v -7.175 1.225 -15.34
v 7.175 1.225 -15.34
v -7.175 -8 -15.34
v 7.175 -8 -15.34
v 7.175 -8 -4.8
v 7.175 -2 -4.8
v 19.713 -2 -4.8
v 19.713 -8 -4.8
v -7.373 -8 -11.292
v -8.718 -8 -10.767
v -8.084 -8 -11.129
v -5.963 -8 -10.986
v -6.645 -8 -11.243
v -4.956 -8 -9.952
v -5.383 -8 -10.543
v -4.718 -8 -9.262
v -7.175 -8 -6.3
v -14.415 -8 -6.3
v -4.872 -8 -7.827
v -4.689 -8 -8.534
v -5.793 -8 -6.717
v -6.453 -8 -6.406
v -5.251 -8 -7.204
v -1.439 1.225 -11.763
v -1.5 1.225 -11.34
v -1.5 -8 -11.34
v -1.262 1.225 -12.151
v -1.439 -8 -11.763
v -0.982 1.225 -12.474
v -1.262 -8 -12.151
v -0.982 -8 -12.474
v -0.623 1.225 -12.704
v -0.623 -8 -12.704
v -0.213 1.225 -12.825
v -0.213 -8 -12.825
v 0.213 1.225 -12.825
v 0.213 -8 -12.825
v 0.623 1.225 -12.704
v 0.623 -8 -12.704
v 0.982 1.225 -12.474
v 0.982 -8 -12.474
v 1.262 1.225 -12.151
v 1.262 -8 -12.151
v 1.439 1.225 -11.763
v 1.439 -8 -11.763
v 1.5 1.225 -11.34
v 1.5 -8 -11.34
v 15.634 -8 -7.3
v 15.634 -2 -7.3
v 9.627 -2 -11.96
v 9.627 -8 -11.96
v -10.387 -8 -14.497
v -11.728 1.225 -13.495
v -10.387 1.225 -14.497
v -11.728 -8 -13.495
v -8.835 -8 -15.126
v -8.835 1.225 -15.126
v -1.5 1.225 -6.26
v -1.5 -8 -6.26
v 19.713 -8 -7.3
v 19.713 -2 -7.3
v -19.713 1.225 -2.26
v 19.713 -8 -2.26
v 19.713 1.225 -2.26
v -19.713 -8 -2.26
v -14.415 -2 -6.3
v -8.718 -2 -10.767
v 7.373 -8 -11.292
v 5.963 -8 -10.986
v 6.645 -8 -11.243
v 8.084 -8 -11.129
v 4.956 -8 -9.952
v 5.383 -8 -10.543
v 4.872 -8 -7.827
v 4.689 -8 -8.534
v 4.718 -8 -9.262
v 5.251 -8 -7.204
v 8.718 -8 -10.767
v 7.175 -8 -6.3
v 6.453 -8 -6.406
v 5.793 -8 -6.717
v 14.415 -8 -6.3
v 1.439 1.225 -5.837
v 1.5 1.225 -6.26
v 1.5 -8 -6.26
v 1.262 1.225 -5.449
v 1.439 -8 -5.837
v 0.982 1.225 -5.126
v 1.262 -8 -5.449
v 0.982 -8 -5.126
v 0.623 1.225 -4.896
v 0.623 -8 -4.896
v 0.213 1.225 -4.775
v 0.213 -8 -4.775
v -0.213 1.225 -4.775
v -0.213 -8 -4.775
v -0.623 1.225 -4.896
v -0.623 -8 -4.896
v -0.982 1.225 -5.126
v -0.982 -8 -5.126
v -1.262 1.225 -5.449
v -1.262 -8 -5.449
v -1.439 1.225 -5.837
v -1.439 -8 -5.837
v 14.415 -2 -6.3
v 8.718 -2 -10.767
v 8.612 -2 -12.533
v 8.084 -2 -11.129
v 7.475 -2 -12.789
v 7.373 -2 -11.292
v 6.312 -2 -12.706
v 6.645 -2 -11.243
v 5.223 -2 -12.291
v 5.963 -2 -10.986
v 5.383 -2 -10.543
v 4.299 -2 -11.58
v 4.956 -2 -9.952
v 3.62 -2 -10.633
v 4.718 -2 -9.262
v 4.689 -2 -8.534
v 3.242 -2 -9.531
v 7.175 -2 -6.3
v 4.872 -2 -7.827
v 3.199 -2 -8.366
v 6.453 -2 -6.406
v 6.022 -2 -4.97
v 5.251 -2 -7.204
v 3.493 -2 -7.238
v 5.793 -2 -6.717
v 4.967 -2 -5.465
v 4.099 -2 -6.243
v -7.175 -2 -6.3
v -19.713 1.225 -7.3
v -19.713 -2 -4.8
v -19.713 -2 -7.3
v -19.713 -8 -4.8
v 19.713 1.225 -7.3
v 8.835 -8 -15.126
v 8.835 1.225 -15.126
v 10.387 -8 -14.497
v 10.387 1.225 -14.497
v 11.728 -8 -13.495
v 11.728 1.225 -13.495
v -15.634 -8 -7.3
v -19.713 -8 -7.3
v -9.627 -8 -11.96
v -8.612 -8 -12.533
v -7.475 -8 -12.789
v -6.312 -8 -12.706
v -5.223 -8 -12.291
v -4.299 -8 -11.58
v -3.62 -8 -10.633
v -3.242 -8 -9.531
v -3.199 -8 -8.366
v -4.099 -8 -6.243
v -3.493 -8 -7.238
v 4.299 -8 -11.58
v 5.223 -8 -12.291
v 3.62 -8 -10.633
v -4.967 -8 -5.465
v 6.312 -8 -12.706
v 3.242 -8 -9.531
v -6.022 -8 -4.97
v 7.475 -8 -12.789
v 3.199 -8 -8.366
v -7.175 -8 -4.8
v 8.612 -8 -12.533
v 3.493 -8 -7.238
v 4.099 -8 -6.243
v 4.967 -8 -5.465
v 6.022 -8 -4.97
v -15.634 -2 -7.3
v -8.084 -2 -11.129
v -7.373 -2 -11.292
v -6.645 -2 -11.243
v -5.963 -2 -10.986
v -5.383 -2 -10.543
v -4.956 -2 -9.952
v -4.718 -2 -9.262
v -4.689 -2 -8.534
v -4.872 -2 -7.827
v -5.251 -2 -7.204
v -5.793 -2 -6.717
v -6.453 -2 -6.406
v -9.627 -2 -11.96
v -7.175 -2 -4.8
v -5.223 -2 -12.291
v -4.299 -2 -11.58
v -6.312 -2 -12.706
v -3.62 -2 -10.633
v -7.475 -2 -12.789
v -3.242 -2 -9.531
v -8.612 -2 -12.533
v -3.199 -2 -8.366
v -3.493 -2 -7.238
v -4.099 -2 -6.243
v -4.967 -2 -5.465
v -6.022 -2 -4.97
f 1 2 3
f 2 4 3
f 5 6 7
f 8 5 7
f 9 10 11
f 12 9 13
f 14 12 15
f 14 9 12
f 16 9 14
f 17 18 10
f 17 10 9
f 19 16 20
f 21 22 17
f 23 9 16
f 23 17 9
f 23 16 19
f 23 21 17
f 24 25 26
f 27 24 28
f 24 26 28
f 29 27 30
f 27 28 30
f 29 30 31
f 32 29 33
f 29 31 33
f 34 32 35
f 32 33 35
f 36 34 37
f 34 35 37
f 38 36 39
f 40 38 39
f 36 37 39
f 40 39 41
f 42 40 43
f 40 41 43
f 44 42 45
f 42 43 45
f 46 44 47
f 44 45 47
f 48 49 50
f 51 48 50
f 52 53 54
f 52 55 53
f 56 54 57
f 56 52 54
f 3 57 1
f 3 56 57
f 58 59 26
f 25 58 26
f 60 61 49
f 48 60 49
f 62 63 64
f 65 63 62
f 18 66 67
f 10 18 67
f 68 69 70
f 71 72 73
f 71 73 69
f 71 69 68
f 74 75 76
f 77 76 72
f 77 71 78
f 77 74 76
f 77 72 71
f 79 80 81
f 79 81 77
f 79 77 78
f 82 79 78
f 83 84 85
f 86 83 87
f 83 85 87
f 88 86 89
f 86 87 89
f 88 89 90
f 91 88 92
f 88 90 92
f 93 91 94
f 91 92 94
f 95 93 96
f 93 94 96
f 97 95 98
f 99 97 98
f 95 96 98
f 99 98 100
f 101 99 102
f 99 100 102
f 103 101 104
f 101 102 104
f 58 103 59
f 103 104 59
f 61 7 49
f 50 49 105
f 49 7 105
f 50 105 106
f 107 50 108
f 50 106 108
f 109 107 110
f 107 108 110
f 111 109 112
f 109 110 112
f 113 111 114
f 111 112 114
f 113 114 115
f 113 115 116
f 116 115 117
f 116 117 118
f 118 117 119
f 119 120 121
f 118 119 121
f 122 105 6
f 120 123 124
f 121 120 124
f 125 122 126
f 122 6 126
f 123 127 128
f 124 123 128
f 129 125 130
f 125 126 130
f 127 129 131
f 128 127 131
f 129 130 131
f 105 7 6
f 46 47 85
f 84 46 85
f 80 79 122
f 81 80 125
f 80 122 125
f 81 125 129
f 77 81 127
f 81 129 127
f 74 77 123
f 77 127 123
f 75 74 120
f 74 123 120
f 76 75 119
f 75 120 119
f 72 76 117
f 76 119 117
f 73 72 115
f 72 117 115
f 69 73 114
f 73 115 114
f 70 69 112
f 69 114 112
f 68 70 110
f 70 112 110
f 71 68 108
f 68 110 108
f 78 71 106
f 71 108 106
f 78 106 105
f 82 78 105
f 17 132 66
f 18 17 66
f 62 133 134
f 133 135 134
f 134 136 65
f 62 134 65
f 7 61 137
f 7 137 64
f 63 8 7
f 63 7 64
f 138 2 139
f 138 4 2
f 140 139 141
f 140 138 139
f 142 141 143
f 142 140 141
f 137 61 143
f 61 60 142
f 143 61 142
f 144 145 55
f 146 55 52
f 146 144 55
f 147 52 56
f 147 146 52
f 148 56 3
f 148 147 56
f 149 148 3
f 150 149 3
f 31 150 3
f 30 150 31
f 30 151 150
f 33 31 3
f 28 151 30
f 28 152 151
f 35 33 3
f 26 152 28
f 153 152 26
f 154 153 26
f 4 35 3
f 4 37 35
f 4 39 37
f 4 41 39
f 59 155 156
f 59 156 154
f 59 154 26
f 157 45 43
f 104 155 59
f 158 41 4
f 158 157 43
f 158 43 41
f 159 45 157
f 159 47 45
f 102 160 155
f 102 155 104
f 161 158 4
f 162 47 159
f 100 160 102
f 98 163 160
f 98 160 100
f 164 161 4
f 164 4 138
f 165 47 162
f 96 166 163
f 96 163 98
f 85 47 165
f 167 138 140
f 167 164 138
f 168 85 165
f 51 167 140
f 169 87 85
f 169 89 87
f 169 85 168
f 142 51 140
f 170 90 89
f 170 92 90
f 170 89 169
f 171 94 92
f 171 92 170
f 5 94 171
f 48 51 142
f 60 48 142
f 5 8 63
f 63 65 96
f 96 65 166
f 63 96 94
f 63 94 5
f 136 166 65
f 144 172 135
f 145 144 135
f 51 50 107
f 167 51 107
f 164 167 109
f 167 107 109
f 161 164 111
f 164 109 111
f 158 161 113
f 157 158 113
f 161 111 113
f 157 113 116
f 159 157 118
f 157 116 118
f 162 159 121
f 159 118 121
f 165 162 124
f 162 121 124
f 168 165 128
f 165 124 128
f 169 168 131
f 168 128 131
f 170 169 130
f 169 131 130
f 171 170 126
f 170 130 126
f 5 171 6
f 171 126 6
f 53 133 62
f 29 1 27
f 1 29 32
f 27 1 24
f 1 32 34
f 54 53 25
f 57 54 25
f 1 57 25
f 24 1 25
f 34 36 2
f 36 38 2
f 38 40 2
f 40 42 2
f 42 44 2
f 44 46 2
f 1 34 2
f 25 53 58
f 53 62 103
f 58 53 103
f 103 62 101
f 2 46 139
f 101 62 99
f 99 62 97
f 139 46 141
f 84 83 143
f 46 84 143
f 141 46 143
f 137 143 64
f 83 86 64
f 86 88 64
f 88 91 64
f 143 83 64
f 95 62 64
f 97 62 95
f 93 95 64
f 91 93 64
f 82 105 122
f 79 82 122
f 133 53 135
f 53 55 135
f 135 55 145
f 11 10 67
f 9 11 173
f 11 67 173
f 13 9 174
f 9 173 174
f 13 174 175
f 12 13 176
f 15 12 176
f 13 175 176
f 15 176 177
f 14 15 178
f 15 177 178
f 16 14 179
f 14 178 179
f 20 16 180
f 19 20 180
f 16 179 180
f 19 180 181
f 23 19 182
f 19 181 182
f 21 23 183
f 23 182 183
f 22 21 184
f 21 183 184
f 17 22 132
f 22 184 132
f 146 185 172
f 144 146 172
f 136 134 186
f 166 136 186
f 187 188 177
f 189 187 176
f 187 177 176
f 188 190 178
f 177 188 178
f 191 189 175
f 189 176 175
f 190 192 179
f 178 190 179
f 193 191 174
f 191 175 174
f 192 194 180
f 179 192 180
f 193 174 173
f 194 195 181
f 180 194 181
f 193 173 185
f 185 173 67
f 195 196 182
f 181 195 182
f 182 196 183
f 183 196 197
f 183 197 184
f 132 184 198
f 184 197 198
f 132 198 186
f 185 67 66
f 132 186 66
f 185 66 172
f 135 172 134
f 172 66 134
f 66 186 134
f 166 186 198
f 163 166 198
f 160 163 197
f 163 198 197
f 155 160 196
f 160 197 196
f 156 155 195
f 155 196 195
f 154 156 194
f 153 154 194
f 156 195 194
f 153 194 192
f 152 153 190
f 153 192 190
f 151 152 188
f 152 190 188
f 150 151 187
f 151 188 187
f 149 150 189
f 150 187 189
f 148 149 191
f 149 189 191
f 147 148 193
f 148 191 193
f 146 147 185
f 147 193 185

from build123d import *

# Parameters (mm, degrees)
F2_DEPTH  = 8
F3_W      = 40
F3_H      = 13.08
F4_DEPTH  = 2
F8_DEPTH  = 25.4
F9_DEPTH  = 0.2869853
F10_DEPTH = 0.2869852618
F11_DEPTH = 1.225
F13_DEPTH = 25.4


# Not quite as in the source:
# - an extrude ends at something that could not be found from the text; its depth is read off the source's solid


with BuildPart() as f2:
    # F1 (on Front) → F2 (new body)
    with BuildSketch(Plane.XZ):
        with BuildLine():
            Line((0, -2.26), (-20, -2.26))
            Line((-20, -2.26), (-20, -4.8))
            Line((-20, -4.8), (-7.175, -4.8))
            ThreePointArc((-7.175, -4.8), (-3.3907124319, -10.0958269953), (-9.6268909943, -11.9604161992))
            Line((-9.6268909943, -11.9604161992), (-15.6340319663, -7.3))
            Line((-15.6340319663, -7.3), (-20, -7.3))
            Line((-20, -7.3), (-20, -15.34))
            Line((-20, -15.34), (0, -15.34))
            Line((0, -15.34), (20, -15.34))
            Line((20, -15.34), (20, -7.3))
            Line((20, -7.3), (15.6340319663, -7.3))
            Line((15.6340319663, -7.3), (9.6268909943, -11.9604161992))
            ThreePointArc((9.6268909943, -11.9604161992), (3.3907124319, -10.0958269953), (7.175, -4.8))
            Line((7.175, -4.8), (20, -4.8))
            Line((20, -4.8), (20, -2.26))
            Line((20, -2.26), (0, -2.26))
        make_face()
    extrude(amount=F2_DEPTH)


with BuildPart() as f2b:
    # F1 (on Front) → F2, piece 2 (new body)
    with BuildSketch(Plane.XZ):
        with BuildLine():
            Line((-14.4153116271, -6.3), (-8.7175368467, -10.7673789865))
            ThreePointArc((-8.7175368467, -10.7673789865), (-4.8119037825, -9.6159511424), (-7.175, -6.3))
            Line((-7.175, -6.3), (-14.4153116271, -6.3))
        make_face()
    extrude(amount=F2_DEPTH)


with BuildPart() as f2c:
    # F1 (on Front) → F2, piece 3 (new body)
    with BuildSketch(Plane.XZ):
        with BuildLine():
            Line((8.7175368467, -10.7673789865), (14.4153116271, -6.3))
            Line((14.4153116271, -6.3), (7.175, -6.3))
            ThreePointArc((7.175, -6.3), (4.8119037825, -9.6159511424), (8.7175368467, -10.7673789865))
        make_face()
    extrude(amount=F2_DEPTH)


with BuildPart() as f4:
    # F3 (on face) → F4 (new body)
    with BuildSketch(Plane(origin=(0, 0, 0), x_dir=(-1, 0, 0), z_dir=(0, 1, 0))):
        with Locations((0, -8.8)):
            Rectangle(F3_W, F3_H)
    extrude(amount=-F4_DEPTH)

    # F5: union F2
    add(f2.part)


with BuildPart() as f2c_1:
    add(f2c.part)

    # F6: union F4, F2b
    add(f4.part)
    add(f2b.part)

    # F7 (on face) → F8 (cut)
    with BuildSketch(Plane.XZ.offset(8)):
        with BuildLine():
            Line((22.5005224347, -7.3), (20, -7.3))
            Line((20, -7.3), (19.7130147382, -7.3))
            Line((19.7130147382, -7.3), (11.7279629554, -13.4949045067))
            ThreePointArc((11.7279629554, -13.4949045067), (9.6313107017, -14.8611993646), (7.175, -15.34))
            Line((7.175, -15.34), (7.175, -19.2080270499))
            Line((7.175, -19.2080270499), (22.5005224347, -19.2080270499))
            Line((22.5005224347, -19.2080270499), (22.5005224347, -7.3))
        make_face()
        with BuildLine():
            Line((-19.7130147382, -7.3), (-20, -7.3))
            Line((-20, -7.3), (-22.5005224347, -7.3))
            Line((-22.5005224347, -7.3), (-22.5005224347, -19.2080270499))
            Line((-22.5005224347, -19.2080270499), (-7.175, -19.2080270499))
            Line((-7.175, -19.2080270499), (-7.175, -15.34))
            ThreePointArc((-7.175, -15.34), (-9.6313107017, -14.8611993646), (-11.7279629554, -13.4949045067))
            Line((-11.7279629554, -13.4949045067), (-19.7130147382, -7.3))
        make_face()
    extrude(amount=-F8_DEPTH, mode=Mode.SUBTRACT)

    # F9 (cut, through all): a face of the model
    f9_faces = [f2c_1.faces().sort_by_distance(p)[0] for p in [
        (20, -3.4075829384, -4.0276303318),
    ]]
    extrude(f9_faces, amount=-F9_DEPTH, mode=Mode.SUBTRACT)

    # F10 (cut, through all): a face of the model
    f10_faces = [f2c_1.faces().sort_by_distance(p)[0] for p in [
        (-20, -3.4075829384, -4.0276303318),
    ]]
    extrude(f10_faces, amount=-F10_DEPTH, mode=Mode.SUBTRACT)

    # F11 (add): a face of the model
    f11_faces = [f2c_1.faces().sort_by_distance(p)[0] for p in [
        (-8.8e-09, 0, -8.042025569),
    ]]
    extrude(f11_faces, amount=F11_DEPTH)

    # F12 (on face) → F13 (cut)
    with BuildSketch(Plane.XZ.offset(8)):
        with BuildLine():
            ThreePointArc((-1.5, -11.34), (0, -12.84), (1.5, -11.34))
            Line((1.5, -11.34), (1.5, -6.26))
            ThreePointArc((1.5, -6.26), (0, -4.76), (-1.5, -6.26))
            Line((-1.5, -6.26), (-1.5, -11.34))
        make_face()
    extrude(amount=-F13_DEPTH, mode=Mode.SUBTRACT)


solid = f2c_1.part
